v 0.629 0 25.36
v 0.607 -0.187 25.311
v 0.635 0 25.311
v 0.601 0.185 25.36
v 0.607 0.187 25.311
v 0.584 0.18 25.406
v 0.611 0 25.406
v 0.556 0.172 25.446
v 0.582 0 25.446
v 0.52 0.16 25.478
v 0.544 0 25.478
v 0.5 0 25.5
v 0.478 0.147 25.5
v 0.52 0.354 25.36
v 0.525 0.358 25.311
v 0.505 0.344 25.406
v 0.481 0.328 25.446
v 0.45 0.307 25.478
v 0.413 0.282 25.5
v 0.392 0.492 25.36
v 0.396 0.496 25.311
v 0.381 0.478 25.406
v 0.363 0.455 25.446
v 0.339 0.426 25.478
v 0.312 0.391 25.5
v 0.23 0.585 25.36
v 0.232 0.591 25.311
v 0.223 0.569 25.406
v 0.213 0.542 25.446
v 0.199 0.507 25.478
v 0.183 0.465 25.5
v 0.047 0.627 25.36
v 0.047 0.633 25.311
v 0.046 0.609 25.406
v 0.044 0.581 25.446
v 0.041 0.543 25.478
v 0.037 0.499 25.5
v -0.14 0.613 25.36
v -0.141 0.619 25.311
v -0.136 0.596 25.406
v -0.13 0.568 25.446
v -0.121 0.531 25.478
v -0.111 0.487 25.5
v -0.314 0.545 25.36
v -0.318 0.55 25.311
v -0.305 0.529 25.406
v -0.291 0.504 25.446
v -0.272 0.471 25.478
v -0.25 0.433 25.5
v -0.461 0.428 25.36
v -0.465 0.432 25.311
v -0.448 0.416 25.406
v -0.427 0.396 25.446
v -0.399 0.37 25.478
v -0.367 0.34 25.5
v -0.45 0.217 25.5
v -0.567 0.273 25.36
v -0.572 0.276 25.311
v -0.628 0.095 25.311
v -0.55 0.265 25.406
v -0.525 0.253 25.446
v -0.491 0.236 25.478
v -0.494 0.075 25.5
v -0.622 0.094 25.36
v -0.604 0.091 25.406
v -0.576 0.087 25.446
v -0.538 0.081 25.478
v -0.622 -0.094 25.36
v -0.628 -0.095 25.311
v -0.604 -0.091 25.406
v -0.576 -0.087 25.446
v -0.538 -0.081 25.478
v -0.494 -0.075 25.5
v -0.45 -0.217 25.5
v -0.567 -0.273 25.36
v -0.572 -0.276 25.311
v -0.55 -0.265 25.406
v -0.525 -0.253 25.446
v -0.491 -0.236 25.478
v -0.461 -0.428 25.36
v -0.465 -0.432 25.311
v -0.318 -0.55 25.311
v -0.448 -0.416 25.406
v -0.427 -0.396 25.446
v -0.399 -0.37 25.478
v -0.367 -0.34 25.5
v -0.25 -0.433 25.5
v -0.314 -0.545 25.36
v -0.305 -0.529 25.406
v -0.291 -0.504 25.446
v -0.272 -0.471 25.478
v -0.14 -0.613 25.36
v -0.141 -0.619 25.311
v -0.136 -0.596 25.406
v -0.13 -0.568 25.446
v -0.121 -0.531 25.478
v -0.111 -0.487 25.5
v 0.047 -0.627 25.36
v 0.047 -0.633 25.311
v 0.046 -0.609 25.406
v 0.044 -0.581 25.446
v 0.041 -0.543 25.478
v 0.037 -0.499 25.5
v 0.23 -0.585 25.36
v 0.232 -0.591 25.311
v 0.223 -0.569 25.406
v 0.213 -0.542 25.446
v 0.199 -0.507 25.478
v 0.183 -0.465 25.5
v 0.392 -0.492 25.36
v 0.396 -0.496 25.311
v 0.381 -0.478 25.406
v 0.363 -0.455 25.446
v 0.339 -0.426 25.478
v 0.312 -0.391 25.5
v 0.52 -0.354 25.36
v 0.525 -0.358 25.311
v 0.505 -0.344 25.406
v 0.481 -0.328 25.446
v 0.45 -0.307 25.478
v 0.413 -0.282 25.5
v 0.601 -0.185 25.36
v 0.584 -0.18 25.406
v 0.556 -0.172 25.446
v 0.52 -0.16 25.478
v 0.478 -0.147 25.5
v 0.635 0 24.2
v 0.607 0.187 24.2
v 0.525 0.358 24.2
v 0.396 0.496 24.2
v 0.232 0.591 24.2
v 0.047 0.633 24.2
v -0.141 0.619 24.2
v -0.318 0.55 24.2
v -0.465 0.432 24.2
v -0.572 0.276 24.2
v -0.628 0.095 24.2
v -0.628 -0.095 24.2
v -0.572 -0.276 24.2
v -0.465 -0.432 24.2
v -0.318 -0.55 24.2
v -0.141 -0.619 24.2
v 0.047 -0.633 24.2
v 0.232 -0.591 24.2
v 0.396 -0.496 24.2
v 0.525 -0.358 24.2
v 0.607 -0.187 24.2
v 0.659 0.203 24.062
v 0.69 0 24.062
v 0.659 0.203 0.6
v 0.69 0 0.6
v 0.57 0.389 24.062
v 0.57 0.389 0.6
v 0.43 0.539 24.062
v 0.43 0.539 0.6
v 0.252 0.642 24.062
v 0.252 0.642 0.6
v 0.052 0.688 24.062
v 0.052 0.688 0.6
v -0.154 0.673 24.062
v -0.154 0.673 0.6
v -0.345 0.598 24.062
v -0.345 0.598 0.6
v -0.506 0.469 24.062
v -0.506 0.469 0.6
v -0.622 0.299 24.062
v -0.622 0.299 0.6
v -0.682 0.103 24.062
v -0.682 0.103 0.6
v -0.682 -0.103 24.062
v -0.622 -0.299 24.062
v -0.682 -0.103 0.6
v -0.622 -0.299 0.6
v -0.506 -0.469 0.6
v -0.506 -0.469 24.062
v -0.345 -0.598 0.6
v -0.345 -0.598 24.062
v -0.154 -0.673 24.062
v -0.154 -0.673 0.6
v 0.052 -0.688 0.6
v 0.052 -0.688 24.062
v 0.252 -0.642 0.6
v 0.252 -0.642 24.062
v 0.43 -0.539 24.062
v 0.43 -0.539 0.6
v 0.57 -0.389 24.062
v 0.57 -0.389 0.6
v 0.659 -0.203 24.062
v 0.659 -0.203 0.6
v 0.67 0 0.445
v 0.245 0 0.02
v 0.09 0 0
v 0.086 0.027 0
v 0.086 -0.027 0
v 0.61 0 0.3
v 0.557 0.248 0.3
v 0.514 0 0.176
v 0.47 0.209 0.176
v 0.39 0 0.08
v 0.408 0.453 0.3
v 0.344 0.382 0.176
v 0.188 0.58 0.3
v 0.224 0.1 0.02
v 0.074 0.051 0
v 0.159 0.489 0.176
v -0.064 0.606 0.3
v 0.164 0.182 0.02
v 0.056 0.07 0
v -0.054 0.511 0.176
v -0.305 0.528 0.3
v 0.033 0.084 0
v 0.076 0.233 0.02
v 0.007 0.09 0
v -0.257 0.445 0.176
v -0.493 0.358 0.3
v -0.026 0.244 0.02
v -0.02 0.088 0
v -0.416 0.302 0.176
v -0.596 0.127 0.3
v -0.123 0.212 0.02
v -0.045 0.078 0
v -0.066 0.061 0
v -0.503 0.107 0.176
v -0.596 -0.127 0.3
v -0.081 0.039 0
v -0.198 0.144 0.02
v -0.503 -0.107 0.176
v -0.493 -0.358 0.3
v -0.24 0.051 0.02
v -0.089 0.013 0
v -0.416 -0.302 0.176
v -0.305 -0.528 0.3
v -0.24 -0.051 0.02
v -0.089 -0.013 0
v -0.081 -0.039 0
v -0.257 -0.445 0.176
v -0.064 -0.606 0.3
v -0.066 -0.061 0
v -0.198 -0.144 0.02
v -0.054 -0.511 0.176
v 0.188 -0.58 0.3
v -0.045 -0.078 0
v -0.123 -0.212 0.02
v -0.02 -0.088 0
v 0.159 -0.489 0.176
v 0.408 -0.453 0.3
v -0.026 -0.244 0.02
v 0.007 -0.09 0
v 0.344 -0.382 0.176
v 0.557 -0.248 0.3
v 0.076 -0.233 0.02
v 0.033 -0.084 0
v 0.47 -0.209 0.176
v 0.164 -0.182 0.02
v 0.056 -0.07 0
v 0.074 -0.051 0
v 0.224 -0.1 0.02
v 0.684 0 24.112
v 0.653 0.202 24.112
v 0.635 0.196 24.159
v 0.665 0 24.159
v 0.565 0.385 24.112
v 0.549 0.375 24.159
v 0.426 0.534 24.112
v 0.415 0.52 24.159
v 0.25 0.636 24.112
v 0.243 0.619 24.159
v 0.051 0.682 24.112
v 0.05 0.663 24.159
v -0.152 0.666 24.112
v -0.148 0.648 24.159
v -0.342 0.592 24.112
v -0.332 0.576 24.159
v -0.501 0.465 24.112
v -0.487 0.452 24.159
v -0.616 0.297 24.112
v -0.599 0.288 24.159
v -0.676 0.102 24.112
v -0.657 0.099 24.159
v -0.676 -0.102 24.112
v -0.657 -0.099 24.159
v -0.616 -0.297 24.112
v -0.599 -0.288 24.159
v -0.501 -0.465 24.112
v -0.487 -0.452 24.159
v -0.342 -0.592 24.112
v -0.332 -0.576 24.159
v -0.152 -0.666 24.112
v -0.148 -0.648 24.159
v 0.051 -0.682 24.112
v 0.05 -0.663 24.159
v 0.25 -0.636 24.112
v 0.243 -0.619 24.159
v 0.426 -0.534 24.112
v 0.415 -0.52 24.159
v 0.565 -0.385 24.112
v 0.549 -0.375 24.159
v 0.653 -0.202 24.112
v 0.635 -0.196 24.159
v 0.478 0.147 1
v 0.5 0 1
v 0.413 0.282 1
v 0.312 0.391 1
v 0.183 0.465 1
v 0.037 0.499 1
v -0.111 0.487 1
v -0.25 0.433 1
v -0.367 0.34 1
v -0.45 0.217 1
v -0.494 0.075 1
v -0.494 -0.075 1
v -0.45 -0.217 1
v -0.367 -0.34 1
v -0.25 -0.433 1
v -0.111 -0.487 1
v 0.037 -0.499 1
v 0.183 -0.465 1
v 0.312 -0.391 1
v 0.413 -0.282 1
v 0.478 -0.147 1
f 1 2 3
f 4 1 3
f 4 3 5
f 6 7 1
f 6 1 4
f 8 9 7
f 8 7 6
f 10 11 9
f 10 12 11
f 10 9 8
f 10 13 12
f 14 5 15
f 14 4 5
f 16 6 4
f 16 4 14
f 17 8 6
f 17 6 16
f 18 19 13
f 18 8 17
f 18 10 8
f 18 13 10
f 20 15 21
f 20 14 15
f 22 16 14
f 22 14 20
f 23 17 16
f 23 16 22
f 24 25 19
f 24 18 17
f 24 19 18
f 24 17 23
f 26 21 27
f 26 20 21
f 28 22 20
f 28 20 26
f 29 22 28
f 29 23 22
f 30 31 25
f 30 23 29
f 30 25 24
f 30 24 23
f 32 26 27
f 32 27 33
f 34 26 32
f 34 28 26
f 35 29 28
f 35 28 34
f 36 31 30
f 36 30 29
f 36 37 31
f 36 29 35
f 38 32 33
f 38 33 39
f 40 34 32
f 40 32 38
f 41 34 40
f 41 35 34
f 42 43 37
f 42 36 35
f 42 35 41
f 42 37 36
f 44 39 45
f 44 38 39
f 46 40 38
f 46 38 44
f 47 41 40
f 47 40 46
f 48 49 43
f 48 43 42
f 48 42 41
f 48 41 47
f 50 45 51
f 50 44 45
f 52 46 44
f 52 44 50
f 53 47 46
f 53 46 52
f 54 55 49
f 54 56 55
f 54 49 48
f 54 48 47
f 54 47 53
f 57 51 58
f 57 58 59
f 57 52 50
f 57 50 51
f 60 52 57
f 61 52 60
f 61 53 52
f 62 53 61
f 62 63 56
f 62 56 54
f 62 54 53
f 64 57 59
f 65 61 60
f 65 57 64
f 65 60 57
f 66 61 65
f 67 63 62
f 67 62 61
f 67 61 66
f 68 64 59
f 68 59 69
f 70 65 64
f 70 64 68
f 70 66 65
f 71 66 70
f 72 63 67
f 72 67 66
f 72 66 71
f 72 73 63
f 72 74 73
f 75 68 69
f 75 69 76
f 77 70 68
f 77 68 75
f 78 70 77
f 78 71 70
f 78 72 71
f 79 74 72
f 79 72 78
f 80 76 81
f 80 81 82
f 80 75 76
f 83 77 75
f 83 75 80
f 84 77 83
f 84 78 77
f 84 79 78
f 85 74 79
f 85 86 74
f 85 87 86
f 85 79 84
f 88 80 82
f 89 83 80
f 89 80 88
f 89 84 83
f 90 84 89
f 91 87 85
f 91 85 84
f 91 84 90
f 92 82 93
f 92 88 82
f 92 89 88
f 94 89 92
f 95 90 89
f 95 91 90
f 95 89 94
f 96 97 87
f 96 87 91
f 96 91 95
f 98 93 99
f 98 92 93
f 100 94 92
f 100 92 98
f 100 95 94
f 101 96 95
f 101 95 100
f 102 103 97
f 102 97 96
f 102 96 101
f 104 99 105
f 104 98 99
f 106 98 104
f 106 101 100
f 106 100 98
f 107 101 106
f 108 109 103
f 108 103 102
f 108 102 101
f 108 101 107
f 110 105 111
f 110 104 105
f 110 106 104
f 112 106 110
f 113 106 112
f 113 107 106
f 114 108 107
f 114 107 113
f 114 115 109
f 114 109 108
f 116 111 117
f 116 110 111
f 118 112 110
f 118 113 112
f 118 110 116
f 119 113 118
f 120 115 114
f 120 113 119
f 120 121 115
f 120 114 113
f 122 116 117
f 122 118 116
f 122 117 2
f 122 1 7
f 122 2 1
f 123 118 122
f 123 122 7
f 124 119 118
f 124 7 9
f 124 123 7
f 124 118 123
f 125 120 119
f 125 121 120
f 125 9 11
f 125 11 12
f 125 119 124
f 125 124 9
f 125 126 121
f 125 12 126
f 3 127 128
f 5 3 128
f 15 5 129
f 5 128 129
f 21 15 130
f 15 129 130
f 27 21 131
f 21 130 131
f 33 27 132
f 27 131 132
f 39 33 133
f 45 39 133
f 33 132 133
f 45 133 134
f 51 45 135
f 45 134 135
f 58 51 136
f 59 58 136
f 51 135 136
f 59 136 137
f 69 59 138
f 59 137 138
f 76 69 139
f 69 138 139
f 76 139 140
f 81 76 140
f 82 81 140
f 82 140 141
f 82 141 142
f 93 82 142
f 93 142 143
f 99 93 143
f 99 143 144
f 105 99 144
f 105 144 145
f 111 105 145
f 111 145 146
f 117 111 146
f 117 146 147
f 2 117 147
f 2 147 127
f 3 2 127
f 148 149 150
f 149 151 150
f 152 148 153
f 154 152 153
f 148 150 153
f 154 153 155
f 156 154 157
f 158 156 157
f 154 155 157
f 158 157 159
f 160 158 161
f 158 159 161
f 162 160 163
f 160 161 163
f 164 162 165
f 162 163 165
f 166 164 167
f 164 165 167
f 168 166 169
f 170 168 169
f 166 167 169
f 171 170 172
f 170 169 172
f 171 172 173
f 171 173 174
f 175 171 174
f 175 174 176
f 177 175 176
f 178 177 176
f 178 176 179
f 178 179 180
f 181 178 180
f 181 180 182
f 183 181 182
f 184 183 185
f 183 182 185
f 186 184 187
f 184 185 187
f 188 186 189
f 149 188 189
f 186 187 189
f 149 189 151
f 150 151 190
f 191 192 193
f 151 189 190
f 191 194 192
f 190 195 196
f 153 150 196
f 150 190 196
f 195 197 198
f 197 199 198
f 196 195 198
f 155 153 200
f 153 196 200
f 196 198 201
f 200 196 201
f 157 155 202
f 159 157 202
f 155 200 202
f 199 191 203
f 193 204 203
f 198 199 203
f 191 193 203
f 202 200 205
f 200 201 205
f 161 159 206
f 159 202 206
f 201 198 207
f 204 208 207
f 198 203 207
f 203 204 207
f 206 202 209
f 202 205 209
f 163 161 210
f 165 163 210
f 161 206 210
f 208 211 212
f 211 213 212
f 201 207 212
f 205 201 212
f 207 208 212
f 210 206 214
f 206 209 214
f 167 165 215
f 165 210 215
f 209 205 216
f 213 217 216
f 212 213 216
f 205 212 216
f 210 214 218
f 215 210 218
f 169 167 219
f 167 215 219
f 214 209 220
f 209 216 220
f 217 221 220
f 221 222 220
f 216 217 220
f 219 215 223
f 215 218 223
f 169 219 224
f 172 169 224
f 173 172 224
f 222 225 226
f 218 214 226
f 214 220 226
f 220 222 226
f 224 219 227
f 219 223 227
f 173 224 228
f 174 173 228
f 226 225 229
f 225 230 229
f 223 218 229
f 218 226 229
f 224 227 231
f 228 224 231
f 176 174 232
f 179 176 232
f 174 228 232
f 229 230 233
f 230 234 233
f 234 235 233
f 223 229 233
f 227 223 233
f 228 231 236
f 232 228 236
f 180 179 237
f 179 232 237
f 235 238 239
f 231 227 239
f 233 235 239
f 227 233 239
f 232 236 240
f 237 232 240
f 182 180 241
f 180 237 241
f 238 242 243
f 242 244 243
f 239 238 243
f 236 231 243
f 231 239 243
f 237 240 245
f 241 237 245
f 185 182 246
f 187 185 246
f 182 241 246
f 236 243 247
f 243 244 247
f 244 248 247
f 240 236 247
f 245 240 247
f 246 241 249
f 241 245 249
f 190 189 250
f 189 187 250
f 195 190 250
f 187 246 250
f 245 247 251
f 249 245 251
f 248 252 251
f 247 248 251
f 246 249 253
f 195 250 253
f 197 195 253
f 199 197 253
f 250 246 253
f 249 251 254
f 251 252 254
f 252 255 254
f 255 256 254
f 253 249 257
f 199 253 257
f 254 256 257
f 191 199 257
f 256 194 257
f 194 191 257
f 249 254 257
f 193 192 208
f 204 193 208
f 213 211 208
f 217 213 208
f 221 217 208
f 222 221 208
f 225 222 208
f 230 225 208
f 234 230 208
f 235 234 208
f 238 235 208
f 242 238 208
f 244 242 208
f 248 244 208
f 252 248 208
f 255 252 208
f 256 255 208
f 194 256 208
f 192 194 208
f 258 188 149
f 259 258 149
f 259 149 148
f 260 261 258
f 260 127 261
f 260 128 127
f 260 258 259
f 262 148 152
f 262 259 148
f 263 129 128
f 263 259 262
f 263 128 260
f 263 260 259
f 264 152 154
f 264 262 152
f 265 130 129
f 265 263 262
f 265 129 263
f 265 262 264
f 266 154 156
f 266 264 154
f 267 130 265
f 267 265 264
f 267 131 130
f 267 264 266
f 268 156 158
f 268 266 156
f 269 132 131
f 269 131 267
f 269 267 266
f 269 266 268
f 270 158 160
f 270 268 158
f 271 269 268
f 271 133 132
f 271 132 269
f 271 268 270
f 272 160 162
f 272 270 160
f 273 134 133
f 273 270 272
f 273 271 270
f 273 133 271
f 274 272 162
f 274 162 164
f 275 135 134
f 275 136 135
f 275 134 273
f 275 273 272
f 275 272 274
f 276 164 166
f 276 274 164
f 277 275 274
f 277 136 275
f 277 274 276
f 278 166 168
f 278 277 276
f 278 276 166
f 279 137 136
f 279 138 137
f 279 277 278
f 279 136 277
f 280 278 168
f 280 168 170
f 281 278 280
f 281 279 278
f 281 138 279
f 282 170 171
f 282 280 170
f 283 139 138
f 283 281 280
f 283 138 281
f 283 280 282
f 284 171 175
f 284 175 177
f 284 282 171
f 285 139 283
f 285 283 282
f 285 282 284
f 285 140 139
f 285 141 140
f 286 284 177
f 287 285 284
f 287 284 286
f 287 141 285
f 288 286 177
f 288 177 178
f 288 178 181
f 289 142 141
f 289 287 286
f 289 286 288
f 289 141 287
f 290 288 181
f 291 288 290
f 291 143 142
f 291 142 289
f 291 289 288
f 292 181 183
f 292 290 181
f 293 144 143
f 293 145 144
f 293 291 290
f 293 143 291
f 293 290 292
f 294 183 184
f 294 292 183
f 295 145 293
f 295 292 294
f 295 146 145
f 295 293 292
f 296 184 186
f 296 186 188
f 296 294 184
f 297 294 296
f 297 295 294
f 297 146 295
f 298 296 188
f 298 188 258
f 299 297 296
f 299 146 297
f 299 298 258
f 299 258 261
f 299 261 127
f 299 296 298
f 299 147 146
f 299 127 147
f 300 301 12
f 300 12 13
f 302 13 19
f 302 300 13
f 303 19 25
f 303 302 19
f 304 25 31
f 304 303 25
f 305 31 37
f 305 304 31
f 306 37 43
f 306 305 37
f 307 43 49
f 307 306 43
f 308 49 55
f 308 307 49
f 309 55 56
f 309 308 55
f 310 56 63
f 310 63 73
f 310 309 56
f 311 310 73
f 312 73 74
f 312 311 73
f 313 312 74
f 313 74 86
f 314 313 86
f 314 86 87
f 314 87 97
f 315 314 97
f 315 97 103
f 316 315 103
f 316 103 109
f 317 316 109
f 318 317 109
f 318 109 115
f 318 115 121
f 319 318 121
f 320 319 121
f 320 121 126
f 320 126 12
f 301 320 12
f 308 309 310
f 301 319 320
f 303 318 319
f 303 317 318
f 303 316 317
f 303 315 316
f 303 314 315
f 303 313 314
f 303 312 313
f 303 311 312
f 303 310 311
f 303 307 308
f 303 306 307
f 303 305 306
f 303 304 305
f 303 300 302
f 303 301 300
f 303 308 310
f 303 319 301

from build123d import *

# Parameters (mm, degrees)
F0_R     = 0.69
F0_R_2   = 0.635
F1_DEPTH = 24.2
F0_R_3   = 0.5
F2_DEPTH = 25.5
F3_DEPTH = 1
F4_R     = 0.6


# Not quite as in the source:
# - a fillet or chamfer that OpenCascade refuses, or shapes differently, is made with other operations: its cross-section is extruded or revolved along the edge and cut away or added


with BuildPart() as f1:
    # F0 (on Top) → F1 (new body)
    with BuildSketch(Plane.XY):
        Circle(F0_R)
        Circle(F0_R_2, mode=Mode.SUBTRACT)
    extrude(amount=F1_DEPTH)

    # F0 (on Top) → F2 (join)
    with BuildSketch(Plane.XY):
        Circle(F0_R_2)
        Circle(F0_R_3, mode=Mode.SUBTRACT)
    extrude(amount=F2_DEPTH)

    # F0 (on Top) → F3 (join)
    with BuildSketch(Plane.XY):
        Circle(F0_R)
        Circle(F0_R_2, mode=Mode.SUBTRACT)
        Circle(F0_R_2)
        Circle(F0_R_3, mode=Mode.SUBTRACT)
        Circle(F0_R_3)
    extrude(amount=F3_DEPTH)

    # F4
    f4_edges = [f1.edges().sort_by_distance(p)[0] for p in [
        (-0.69, 0, 0),
    ]]
    fillet(f4_edges, radius=F4_R)

    # F5: fillet of radius 0.2 on 2 edges, made by hand

    # F5_s1 → F5_t2 (revolve, cut)
    with BuildSketch(Plane.XZ):
        with BuildLine():
            ThreePointArc((0.69, 24.0622502269), (0.6757417562, 24.1364122117), (0.635, 24.2))
            Line((0.635, 24.2), (0.69, 24.2))
            Line((0.69, 24.2), (0.69, 24.0622502269))
        make_face()
    revolve(axis=Axis((0, 0, 24.2), (0, 0, 1)), mode=Mode.SUBTRACT)

    # F5_s3 → F5_t4 (revolve, cut)
    with BuildSketch(Plane.XZ):
        with BuildLine():
            ThreePointArc((0.635, 25.3108571968), (0.597788206, 25.4270466972), (0.5, 25.5))
            Line((0.5, 25.5), (0.635, 25.5))
            Line((0.635, 25.5), (0.635, 25.3108571968))
        make_face()
    revolve(axis=Axis((0, 0, 25.5), (0, 0, 1)), mode=Mode.SUBTRACT)


solid = f1.part
